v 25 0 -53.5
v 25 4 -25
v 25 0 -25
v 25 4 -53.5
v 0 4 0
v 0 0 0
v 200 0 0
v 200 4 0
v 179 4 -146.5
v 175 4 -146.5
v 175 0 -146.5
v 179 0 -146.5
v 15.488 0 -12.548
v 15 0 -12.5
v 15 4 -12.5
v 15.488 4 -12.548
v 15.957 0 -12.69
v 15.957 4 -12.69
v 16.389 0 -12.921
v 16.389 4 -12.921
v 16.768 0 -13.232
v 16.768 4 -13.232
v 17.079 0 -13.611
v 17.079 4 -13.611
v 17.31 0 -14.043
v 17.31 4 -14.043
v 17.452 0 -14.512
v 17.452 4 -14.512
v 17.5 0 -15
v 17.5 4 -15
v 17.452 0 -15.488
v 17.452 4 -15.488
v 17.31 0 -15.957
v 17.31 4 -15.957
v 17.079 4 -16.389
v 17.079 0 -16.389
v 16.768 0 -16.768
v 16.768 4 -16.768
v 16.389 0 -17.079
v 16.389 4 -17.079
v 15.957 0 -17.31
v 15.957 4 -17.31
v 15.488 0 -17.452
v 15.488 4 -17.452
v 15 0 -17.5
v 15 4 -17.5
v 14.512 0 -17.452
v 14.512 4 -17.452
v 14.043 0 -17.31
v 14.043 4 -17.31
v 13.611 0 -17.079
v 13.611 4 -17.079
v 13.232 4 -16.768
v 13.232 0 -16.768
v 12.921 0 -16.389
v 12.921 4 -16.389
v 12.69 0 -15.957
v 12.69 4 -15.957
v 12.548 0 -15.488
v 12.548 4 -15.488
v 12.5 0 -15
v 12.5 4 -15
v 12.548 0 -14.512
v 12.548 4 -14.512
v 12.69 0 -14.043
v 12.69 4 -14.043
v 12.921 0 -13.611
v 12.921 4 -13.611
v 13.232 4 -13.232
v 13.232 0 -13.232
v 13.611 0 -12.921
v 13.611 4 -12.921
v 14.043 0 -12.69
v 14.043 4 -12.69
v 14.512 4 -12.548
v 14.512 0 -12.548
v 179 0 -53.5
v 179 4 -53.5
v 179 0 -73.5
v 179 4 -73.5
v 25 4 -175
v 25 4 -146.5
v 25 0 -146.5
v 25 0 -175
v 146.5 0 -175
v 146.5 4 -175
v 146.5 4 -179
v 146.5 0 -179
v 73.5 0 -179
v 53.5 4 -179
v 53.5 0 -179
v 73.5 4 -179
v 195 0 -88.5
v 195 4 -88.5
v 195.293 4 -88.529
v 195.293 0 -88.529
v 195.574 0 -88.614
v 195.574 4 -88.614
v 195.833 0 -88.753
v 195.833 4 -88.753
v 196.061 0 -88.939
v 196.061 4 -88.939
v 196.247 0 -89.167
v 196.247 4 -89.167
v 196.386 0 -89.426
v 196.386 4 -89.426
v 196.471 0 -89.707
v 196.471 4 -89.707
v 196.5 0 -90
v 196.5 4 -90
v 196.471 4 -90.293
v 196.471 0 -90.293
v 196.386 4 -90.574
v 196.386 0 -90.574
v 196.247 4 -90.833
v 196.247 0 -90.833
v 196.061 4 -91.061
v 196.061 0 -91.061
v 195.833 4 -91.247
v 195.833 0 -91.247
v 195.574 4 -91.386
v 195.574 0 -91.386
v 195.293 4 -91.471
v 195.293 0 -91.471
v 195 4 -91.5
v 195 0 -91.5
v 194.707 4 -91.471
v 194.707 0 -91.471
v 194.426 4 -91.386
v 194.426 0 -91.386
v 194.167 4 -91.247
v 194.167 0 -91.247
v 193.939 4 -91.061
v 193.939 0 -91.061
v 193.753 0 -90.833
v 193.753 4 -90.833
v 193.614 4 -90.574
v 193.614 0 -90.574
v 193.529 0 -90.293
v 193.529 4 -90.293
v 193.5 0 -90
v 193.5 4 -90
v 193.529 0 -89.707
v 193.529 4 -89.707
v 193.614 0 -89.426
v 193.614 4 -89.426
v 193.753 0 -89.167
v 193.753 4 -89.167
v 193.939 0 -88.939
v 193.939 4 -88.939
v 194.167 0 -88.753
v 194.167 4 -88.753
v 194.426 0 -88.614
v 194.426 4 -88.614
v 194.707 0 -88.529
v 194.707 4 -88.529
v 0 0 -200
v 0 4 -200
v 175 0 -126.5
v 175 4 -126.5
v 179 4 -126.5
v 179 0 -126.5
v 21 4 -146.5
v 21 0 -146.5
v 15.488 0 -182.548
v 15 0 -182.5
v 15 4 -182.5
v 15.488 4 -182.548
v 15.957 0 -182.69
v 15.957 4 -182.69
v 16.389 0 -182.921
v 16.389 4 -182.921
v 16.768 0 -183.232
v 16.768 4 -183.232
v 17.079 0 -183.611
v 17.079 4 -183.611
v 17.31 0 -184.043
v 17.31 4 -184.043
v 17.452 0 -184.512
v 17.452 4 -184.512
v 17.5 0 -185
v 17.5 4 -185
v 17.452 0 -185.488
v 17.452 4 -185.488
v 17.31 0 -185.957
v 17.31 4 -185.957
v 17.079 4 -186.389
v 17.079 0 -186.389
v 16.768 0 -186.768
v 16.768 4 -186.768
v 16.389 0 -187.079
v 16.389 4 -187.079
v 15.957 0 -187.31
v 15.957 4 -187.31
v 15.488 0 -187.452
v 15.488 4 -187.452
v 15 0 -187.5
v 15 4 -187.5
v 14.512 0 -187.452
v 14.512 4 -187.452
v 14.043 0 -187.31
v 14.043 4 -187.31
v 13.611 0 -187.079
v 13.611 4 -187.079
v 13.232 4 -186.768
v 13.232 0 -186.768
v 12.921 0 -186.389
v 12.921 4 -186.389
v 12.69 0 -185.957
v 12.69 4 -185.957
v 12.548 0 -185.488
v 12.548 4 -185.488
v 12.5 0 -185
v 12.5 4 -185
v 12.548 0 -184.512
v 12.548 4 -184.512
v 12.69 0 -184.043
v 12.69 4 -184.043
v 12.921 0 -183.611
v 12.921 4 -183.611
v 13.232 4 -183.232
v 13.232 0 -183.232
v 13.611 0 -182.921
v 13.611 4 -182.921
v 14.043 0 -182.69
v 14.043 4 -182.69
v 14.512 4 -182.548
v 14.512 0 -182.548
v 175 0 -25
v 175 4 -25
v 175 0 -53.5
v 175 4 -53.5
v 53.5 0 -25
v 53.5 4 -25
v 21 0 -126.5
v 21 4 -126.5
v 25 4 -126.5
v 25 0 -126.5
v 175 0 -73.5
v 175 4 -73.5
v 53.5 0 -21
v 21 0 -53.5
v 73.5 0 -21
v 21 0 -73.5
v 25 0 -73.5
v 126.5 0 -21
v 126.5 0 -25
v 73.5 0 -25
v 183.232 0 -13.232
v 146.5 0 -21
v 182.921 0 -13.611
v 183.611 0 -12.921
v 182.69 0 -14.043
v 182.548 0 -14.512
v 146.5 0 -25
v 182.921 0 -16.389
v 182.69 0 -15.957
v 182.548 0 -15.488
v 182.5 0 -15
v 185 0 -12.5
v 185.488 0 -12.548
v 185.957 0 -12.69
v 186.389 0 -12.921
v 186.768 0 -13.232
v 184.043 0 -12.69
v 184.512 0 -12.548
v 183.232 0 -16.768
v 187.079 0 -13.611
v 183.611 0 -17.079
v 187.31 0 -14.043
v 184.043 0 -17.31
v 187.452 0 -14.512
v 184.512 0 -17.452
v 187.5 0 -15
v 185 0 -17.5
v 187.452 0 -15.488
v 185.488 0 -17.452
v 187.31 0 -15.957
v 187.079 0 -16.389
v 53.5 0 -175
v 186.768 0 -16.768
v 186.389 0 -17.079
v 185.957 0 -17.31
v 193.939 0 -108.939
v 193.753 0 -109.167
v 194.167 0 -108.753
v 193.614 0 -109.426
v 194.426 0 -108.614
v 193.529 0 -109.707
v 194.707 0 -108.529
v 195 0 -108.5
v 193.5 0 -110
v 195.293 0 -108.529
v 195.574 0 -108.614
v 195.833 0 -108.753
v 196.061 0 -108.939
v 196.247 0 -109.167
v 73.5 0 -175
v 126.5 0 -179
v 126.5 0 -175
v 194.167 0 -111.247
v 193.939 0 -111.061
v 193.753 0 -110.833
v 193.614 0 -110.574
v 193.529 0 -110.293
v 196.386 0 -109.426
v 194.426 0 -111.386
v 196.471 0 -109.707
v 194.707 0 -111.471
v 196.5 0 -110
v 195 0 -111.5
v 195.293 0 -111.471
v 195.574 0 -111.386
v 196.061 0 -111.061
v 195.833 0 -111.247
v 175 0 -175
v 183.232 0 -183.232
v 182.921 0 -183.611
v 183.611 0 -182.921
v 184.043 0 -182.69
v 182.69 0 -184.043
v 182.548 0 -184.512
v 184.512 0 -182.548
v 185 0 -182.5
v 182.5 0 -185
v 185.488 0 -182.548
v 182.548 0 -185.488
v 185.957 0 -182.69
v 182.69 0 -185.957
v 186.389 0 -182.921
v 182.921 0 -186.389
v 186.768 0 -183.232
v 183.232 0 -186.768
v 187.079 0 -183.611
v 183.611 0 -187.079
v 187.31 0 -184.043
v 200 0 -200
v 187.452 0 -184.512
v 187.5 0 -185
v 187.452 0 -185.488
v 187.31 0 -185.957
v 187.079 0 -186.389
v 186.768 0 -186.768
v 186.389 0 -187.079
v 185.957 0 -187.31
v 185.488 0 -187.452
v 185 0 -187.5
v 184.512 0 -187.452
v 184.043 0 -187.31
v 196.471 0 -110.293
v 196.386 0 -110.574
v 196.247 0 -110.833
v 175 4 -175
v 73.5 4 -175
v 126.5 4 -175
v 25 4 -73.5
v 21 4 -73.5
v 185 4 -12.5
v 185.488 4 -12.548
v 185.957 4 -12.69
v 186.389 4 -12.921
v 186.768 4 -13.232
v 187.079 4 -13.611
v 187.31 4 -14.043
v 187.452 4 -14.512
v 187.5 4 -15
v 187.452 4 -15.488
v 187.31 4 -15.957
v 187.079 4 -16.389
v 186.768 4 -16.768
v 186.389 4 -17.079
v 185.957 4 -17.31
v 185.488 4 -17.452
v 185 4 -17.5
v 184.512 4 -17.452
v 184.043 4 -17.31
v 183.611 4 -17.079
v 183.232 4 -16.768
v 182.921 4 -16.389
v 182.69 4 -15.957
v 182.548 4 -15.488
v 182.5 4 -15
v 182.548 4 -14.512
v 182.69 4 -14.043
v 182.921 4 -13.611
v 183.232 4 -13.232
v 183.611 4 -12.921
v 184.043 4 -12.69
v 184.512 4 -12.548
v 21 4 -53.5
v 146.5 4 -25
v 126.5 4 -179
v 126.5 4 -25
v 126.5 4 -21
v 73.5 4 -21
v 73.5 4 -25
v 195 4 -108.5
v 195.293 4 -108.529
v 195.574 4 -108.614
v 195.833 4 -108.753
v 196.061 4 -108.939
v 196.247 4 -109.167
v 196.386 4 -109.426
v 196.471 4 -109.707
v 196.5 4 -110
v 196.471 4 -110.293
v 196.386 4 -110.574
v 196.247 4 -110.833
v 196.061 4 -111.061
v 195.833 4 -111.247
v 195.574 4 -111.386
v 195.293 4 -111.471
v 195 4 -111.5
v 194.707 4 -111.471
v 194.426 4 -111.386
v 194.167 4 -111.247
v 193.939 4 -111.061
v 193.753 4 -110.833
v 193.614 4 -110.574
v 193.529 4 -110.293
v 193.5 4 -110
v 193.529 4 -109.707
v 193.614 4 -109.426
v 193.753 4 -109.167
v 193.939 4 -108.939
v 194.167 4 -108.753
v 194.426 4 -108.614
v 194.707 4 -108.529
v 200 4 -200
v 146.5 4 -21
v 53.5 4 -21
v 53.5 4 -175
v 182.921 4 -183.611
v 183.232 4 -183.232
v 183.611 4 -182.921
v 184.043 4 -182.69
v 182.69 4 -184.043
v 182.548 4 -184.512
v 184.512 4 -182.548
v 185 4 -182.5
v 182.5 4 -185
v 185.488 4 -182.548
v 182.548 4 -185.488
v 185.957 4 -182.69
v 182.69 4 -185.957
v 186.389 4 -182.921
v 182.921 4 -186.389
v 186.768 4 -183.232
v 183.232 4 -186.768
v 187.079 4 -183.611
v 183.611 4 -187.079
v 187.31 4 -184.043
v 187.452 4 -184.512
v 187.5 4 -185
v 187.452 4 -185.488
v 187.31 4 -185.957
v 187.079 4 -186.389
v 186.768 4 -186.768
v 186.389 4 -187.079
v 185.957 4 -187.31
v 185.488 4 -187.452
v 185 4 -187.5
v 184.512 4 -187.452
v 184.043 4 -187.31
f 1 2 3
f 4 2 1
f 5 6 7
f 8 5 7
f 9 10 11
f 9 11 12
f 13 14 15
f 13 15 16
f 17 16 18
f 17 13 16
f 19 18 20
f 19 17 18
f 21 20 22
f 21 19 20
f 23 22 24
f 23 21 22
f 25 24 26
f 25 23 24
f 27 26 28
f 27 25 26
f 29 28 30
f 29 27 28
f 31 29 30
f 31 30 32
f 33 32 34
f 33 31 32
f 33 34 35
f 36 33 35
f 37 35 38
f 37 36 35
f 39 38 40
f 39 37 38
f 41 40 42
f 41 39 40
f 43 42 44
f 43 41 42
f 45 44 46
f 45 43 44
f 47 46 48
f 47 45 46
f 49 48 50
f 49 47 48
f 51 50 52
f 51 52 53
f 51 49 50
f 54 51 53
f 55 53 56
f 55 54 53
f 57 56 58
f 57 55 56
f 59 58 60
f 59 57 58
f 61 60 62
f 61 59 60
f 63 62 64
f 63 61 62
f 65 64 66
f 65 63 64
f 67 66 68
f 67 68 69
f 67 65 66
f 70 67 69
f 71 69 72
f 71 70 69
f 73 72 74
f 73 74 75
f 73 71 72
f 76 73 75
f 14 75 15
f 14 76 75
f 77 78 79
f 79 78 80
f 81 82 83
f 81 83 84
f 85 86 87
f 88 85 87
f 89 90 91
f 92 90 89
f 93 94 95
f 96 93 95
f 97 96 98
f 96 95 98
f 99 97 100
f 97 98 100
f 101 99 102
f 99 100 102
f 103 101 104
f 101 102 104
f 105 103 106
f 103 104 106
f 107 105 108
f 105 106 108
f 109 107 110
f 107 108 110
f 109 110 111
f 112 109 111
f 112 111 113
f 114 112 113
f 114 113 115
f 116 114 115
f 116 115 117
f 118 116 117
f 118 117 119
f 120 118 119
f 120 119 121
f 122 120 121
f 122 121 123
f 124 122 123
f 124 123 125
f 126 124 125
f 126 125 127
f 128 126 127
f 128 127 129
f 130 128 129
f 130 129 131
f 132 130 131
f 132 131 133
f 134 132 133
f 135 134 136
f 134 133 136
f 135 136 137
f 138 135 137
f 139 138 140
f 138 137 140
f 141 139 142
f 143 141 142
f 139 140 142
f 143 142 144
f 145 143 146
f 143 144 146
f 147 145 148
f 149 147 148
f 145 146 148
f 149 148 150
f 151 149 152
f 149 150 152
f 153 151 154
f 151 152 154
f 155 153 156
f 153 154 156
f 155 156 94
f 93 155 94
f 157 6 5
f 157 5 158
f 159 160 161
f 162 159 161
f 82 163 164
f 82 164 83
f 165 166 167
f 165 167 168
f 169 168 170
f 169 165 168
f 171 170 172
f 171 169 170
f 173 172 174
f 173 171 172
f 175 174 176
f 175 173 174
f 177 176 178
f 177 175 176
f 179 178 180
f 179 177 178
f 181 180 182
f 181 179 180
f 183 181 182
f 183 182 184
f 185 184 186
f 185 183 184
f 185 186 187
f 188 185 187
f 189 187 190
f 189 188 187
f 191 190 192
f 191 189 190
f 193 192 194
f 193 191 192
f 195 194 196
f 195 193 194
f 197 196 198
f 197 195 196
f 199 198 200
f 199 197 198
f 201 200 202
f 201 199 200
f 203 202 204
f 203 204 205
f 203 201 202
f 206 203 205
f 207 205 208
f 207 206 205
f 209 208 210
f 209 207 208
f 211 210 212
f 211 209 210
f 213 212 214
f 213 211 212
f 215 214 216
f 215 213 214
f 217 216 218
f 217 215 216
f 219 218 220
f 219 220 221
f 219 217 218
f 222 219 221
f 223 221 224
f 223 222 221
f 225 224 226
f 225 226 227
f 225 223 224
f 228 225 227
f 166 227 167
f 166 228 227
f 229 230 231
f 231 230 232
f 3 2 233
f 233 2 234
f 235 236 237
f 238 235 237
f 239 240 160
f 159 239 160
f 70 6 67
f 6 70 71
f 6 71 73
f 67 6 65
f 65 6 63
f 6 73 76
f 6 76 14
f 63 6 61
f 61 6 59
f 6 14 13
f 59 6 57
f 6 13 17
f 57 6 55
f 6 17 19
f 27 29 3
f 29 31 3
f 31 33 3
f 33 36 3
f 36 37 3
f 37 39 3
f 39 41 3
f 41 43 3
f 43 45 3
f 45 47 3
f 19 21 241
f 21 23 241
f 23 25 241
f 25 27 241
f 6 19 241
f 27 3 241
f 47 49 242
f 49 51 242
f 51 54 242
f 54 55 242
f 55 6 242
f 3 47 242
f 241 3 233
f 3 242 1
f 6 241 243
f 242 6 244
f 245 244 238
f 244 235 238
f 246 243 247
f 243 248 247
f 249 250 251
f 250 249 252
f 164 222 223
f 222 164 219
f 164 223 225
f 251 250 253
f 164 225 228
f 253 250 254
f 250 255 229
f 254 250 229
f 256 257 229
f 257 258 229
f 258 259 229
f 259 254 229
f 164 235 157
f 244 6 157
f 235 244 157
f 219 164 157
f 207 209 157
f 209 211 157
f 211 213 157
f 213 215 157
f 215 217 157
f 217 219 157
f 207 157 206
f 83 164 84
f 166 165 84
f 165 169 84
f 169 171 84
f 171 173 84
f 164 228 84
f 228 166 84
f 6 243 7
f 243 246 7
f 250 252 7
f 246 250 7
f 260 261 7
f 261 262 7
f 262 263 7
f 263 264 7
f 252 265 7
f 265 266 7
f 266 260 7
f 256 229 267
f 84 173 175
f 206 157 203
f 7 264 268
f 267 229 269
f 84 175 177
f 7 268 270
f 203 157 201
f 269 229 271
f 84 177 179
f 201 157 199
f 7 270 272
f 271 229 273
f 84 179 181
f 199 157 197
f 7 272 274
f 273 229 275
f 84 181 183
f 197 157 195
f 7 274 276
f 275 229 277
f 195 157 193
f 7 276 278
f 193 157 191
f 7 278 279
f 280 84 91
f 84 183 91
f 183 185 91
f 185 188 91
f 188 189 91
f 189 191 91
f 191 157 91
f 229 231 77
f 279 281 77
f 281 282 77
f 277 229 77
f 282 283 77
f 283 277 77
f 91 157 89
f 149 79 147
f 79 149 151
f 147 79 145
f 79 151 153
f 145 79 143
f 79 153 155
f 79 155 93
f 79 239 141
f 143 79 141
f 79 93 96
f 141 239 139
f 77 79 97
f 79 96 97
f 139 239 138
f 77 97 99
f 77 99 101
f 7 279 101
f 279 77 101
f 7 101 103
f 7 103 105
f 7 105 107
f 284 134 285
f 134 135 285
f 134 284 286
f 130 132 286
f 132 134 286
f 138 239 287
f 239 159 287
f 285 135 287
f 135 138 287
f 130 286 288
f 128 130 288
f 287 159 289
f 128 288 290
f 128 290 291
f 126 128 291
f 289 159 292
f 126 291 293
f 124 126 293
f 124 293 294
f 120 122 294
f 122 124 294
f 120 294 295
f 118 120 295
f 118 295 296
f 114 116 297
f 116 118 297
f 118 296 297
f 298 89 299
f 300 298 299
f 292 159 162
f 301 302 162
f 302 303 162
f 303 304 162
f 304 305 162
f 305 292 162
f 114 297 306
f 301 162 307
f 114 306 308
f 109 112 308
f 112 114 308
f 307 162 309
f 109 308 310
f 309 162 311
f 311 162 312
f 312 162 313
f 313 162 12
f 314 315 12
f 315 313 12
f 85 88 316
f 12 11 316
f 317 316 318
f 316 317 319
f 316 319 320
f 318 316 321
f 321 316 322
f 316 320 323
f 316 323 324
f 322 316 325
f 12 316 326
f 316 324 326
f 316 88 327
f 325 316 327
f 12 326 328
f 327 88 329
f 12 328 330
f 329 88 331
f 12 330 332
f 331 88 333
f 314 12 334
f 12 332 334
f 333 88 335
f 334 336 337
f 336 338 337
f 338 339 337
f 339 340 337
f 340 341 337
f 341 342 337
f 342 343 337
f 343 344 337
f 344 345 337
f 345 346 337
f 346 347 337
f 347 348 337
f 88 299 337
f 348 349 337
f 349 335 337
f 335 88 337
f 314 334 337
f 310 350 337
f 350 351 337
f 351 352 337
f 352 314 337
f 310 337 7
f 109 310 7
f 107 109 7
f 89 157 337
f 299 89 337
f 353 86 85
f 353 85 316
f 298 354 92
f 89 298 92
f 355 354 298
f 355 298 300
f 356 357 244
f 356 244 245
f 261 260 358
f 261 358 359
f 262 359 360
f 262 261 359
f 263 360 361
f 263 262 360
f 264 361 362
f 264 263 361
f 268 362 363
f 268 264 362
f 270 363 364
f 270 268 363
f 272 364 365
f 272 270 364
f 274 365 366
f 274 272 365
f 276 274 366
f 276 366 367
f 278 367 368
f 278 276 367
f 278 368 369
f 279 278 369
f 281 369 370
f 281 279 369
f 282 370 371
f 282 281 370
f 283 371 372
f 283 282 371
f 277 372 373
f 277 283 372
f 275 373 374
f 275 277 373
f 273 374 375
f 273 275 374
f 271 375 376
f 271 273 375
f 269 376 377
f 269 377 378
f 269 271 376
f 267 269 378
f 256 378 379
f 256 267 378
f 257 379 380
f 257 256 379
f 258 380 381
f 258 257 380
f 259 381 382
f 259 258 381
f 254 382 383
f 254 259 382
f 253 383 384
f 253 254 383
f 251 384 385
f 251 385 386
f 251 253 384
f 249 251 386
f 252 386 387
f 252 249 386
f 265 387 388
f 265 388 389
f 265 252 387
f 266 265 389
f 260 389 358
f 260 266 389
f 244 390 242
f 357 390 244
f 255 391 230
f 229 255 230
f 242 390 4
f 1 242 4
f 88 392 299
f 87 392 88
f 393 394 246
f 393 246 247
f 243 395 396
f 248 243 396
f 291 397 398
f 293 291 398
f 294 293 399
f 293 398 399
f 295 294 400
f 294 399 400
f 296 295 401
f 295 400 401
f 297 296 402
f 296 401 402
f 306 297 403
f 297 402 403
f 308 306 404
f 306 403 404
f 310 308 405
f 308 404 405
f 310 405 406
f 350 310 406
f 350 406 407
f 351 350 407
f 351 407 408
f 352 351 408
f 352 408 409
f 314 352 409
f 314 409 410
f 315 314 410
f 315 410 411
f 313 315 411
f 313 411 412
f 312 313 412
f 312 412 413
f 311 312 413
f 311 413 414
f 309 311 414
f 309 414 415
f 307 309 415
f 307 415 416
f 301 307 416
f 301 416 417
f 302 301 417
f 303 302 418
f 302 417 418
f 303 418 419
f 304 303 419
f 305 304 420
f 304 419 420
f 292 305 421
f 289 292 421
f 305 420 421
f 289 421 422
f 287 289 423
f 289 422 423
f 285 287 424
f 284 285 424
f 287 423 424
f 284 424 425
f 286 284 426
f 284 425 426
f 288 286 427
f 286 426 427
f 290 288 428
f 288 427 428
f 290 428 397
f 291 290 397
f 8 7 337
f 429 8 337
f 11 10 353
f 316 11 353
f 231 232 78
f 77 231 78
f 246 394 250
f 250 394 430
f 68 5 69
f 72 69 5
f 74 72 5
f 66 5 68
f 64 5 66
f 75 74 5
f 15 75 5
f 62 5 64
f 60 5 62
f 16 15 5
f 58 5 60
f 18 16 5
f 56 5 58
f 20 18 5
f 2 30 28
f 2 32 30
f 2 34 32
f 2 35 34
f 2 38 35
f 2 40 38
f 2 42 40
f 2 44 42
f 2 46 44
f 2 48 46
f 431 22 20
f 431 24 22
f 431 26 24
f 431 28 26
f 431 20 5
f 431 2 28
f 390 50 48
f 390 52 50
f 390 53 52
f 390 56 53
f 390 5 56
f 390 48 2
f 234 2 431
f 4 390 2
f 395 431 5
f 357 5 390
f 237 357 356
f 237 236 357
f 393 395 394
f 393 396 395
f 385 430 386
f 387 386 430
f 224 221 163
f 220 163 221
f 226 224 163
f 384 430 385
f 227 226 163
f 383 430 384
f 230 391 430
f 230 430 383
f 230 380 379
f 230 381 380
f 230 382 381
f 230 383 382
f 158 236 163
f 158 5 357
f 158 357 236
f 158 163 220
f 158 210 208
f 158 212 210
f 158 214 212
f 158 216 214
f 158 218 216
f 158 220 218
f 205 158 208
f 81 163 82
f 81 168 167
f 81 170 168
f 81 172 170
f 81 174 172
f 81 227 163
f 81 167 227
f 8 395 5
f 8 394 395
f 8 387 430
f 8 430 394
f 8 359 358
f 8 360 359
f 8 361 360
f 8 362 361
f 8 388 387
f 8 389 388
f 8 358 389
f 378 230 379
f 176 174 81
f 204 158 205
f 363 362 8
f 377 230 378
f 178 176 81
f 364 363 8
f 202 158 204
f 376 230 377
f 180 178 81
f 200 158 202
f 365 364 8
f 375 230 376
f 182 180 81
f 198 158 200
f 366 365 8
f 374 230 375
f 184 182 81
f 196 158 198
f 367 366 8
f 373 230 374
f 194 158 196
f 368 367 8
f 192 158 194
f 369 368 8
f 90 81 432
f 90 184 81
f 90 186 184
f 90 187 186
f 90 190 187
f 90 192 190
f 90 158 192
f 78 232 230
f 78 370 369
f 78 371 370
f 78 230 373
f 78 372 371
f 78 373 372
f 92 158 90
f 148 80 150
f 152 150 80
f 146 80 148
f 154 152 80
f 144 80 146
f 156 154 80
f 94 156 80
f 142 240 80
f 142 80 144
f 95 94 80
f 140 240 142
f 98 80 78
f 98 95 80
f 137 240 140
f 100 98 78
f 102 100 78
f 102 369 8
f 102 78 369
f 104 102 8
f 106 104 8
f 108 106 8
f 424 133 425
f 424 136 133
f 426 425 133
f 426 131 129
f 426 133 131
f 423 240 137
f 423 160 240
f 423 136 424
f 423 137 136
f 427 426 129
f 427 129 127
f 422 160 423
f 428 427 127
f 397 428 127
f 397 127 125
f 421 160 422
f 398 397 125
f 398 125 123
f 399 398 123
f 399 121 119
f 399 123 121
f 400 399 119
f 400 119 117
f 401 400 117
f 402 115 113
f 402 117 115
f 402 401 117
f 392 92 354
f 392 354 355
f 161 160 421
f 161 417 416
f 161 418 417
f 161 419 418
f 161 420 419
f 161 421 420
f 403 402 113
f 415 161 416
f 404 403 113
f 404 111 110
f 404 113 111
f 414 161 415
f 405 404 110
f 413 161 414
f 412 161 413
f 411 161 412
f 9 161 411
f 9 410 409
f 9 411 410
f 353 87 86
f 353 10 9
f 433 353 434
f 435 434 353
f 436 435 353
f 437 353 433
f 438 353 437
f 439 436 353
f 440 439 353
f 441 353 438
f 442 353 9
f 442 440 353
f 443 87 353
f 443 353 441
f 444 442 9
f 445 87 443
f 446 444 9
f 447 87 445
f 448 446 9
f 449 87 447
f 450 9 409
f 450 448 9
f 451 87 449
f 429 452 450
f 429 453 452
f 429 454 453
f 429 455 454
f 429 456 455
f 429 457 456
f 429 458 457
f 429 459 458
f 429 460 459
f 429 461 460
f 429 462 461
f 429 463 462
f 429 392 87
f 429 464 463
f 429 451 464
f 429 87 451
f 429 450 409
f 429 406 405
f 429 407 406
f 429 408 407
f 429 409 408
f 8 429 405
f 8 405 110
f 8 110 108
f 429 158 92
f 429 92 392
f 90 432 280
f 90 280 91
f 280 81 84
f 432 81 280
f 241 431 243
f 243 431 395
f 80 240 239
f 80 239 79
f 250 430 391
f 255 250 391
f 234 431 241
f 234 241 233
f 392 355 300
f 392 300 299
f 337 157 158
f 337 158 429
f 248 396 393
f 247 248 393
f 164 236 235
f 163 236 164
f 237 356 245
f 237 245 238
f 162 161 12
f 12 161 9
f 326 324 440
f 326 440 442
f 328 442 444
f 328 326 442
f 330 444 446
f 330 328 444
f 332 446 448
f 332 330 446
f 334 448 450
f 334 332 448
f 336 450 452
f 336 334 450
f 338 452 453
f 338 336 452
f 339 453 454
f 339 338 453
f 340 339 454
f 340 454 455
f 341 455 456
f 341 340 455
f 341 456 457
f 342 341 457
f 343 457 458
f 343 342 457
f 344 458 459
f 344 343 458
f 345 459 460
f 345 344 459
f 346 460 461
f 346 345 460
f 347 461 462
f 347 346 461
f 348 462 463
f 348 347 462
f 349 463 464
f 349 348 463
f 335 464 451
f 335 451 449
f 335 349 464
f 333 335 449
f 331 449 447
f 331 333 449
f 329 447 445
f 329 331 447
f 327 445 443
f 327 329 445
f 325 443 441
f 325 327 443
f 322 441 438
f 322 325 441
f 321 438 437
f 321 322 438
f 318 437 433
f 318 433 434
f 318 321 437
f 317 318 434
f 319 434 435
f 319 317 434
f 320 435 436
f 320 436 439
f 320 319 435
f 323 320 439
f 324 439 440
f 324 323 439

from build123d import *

# Parameters (mm, degrees)
CROQUIS1_W              = 200
CROQUIS1_H              = 200
CROQUIS1_R              = 2.5
SALIENTE_EXTRUIR1_DEPTH = 4
CROQUIS2_W              = 150
CROQUIS2_H              = 150
CROQUIS2_W_2            = 4
CROQUIS2_H_2            = 20
CROQUIS2_W_3            = 20
CROQUIS2_H_3            = 4
CORTAR_EXTRUIR1_DEPTH   = 4
CROQUIS3_R              = 1.5
CORTAR_EXTRUIR2_DEPTH   = 10


with BuildPart() as part:
    # Croquis1 → Saliente-Extruir1 (new body)
    with BuildSketch(Plane(origin=(0, 0, 0), x_dir=(1, 0, 0), z_dir=(0, 1, 0))):
        with Locations((100, 100)):
            Rectangle(CROQUIS1_W, CROQUIS1_H)
        with Locations(Location((15, 185, 0), (0, 0, 270))):
            Circle(CROQUIS1_R, mode=Mode.SUBTRACT)
        with Locations(Location((185, 185, 0), (0, 0, 270))):
            Circle(CROQUIS1_R, mode=Mode.SUBTRACT)
        with Locations(Location((185, 15, 0), (0, 0, 270))):
            Circle(CROQUIS1_R, mode=Mode.SUBTRACT)
        with Locations(Location((15, 15, 0), (0, 0, 270))):
            Circle(CROQUIS1_R, mode=Mode.SUBTRACT)
    extrude(amount=SALIENTE_EXTRUIR1_DEPTH)

    # Croquis2 → Cortar-Extruir1 (cut)
    with BuildSketch(Plane(origin=(0, 4, 0), x_dir=(1, 0, 0), z_dir=(0, 1, 0))):
        with Locations((100, 100)):
            Rectangle(CROQUIS2_W, CROQUIS2_H)
        with Locations((23, 136.5)):
            Rectangle(CROQUIS2_W_2, CROQUIS2_H_2)
        with Locations((63.5, 177)):
            Rectangle(CROQUIS2_W_3, CROQUIS2_H_3)
        with Locations((177, 136.5)):
            Rectangle(CROQUIS2_W_2, CROQUIS2_H_2)
        with Locations((136.5, 177)):
            Rectangle(CROQUIS2_W_3, CROQUIS2_H_3)
        with Locations((136.5, 23)):
            Rectangle(CROQUIS2_W_3, CROQUIS2_H_3)
        with Locations((177, 63.5)):
            Rectangle(CROQUIS2_W_2, CROQUIS2_H_2)
        with Locations((23, 63.5)):
            Rectangle(CROQUIS2_W_2, CROQUIS2_H_2)
        with Locations((63.5, 23)):
            Rectangle(CROQUIS2_W_3, CROQUIS2_H_3)
    extrude(amount=-CORTAR_EXTRUIR1_DEPTH, mode=Mode.SUBTRACT)

    # Croquis3 → Cortar-Extruir2 (cut)
    with BuildSketch(Plane(origin=(0, 4, 0), x_dir=(1, 0, 0), z_dir=(0, 1, 0))):
        with Locations(Location((195, 110, 0), (0, 0, 270))):
            Circle(CROQUIS3_R)
        with Locations(Location((195, 90, 0), (0, 0, 270))):
            Circle(CROQUIS3_R)
    extrude(amount=-CORTAR_EXTRUIR2_DEPTH, mode=Mode.SUBTRACT)


solid = part.part
